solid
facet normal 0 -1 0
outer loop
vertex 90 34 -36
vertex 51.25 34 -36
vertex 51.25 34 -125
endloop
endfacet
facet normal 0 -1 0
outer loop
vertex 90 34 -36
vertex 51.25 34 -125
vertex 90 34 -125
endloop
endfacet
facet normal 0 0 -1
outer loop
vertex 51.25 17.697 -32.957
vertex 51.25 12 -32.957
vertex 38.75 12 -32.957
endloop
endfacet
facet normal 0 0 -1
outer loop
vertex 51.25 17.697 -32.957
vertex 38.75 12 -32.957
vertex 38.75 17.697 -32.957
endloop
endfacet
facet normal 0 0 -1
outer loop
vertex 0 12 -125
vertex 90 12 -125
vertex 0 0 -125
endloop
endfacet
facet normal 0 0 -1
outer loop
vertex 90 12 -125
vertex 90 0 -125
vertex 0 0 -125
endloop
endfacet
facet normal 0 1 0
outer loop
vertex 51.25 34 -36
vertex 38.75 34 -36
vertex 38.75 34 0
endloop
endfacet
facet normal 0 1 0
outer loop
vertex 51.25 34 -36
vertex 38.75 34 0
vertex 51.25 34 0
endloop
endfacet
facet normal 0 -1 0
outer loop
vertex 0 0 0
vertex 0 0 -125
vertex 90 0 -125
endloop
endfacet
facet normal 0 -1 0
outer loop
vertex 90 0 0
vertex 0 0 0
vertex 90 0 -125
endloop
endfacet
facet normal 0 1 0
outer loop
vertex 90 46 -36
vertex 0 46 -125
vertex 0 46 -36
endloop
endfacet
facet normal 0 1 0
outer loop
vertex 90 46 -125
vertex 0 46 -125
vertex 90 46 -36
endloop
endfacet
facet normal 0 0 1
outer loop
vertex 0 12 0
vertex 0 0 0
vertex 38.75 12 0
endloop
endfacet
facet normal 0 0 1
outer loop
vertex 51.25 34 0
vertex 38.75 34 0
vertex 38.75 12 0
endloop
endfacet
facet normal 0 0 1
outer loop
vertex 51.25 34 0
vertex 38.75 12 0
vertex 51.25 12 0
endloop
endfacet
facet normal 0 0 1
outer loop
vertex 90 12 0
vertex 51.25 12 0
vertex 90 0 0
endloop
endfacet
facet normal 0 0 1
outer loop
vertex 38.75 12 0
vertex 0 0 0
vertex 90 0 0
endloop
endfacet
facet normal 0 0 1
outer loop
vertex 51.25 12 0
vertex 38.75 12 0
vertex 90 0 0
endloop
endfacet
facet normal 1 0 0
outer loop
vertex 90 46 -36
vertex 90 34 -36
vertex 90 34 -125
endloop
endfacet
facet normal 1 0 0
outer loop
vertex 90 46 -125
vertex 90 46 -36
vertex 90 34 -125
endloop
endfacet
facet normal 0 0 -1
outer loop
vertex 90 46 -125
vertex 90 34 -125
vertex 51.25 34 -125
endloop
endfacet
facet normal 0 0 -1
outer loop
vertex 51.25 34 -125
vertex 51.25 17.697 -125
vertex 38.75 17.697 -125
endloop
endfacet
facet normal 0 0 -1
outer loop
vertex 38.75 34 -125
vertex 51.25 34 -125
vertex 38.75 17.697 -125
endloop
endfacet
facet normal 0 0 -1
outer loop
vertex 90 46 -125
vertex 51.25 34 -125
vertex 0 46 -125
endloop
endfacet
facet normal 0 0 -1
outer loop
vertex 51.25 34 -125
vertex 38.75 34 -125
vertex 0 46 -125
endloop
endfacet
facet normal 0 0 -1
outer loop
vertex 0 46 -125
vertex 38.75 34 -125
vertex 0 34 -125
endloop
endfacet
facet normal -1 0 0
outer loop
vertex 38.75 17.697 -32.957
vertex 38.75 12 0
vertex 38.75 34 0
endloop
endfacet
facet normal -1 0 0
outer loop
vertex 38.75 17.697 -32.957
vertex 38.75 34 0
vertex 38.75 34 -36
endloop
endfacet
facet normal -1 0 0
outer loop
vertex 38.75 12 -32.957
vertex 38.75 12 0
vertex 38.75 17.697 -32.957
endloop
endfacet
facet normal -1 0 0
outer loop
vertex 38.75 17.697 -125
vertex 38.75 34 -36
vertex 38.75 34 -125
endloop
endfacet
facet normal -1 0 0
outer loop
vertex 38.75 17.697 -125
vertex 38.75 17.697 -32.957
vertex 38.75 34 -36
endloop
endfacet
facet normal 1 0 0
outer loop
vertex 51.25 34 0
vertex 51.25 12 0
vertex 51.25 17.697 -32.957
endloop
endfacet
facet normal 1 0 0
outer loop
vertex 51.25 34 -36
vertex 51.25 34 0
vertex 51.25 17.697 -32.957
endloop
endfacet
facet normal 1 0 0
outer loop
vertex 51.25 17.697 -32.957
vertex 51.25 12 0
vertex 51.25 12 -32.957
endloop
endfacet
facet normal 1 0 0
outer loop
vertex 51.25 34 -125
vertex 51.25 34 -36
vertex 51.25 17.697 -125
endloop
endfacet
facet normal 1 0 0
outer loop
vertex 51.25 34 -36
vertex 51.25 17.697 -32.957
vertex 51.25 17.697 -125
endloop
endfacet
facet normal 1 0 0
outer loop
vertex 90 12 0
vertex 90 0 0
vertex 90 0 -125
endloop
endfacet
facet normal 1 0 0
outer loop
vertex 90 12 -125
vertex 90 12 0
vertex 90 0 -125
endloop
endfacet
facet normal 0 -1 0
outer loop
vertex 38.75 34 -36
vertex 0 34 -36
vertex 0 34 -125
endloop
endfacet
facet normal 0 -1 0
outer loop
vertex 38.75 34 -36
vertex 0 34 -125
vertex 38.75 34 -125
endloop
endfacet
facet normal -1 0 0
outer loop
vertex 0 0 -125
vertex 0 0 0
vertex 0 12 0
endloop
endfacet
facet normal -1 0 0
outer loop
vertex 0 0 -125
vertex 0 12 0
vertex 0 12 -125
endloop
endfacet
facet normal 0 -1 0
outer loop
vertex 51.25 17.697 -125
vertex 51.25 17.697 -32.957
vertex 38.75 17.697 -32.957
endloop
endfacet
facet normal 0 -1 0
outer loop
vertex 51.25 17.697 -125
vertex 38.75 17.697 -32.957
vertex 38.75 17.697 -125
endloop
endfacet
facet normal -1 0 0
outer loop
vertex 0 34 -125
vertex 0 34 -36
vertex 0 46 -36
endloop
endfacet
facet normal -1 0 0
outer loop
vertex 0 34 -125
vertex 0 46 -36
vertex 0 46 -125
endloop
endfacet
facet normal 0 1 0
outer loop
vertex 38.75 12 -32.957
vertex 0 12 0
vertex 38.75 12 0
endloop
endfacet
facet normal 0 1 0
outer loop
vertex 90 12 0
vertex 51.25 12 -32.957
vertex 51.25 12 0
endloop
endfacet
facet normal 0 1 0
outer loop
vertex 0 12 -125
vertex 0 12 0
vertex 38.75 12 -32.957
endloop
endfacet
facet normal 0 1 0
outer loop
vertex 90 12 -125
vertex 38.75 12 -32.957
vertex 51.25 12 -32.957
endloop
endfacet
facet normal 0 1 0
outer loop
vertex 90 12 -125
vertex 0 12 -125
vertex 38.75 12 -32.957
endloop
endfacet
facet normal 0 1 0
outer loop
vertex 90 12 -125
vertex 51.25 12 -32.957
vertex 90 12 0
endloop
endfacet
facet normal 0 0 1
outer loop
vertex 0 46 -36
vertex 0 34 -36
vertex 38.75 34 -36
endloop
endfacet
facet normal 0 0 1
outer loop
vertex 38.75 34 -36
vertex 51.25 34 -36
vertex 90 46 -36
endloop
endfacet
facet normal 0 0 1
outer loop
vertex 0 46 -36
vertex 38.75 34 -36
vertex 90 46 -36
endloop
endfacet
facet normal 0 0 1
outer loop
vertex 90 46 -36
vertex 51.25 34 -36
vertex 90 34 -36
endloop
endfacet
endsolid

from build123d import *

# Parameters (mm, degrees)
SKETCH1_W           = 90
SKETCH1_H           = 125
BOSS_EXTRUDE1_DEPTH = 12
SKETCH2_W           = 12.5
SKETCH2_H           = 125
BOSS_EXTRUDE2_DEPTH = 22
SKETCH3_W           = 38.75
SKETCH3_H           = 89
SKETCH3_W_2         = 6.25
BOSS_EXTRUDE3_DEPTH = 12
SKETCH4_W           = 92.043364018
SKETCH4_H           = 5.697421696
CUT_EXTRUDE1_DEPTH  = 143.714969432


with BuildPart() as part:
    # Sketch1 → Boss-Extrude1 (new body)
    with BuildSketch(Plane(origin=(0, 0, 0), x_dir=(1, 0, 0), z_dir=(0, 1, 0))):
        with Locations((45, 62.5)):
            Rectangle(SKETCH1_W, SKETCH1_H)
    extrude(amount=BOSS_EXTRUDE1_DEPTH)

    # Sketch2 → Boss-Extrude2 (add)
    with BuildSketch(Plane(origin=(0, 12, 0), x_dir=(1, 0, 0), z_dir=(0, 1, 0))):
        with Locations((45, 62.5)):
            Rectangle(SKETCH2_W, SKETCH2_H)
    extrude(amount=BOSS_EXTRUDE2_DEPTH)

    # Sketch3 → Boss-Extrude3 (add)
    with BuildSketch(Plane(origin=(0, 34, 0), x_dir=(1, 0, 0), z_dir=(0, 1, 0))):
        with Locations((70.625, 80.5)):
            Rectangle(SKETCH3_W, SKETCH3_H)
        with Locations((19.375, 80.5)):
            Rectangle(SKETCH3_W, SKETCH3_H)
        with Locations((41.875, 80.5)):
            Rectangle(SKETCH3_W_2, SKETCH3_H)
        with Locations((48.125, 80.5)):
            Rectangle(SKETCH3_W_2, SKETCH3_H)
    extrude(amount=BOSS_EXTRUDE3_DEPTH)

    # Sketch4 → Cut-Extrude1 (cut, through all)
    with BuildSketch(Plane(origin=(51.25, 0, 0), x_dir=(0, 0, -1), z_dir=(1, 0, 0))):
        with Locations((78.978317991, 14.848710848)):
            Rectangle(SKETCH4_W, SKETCH4_H)
    extrude(amount=-CUT_EXTRUDE1_DEPTH, mode=Mode.SUBTRACT)


solid = part.part
